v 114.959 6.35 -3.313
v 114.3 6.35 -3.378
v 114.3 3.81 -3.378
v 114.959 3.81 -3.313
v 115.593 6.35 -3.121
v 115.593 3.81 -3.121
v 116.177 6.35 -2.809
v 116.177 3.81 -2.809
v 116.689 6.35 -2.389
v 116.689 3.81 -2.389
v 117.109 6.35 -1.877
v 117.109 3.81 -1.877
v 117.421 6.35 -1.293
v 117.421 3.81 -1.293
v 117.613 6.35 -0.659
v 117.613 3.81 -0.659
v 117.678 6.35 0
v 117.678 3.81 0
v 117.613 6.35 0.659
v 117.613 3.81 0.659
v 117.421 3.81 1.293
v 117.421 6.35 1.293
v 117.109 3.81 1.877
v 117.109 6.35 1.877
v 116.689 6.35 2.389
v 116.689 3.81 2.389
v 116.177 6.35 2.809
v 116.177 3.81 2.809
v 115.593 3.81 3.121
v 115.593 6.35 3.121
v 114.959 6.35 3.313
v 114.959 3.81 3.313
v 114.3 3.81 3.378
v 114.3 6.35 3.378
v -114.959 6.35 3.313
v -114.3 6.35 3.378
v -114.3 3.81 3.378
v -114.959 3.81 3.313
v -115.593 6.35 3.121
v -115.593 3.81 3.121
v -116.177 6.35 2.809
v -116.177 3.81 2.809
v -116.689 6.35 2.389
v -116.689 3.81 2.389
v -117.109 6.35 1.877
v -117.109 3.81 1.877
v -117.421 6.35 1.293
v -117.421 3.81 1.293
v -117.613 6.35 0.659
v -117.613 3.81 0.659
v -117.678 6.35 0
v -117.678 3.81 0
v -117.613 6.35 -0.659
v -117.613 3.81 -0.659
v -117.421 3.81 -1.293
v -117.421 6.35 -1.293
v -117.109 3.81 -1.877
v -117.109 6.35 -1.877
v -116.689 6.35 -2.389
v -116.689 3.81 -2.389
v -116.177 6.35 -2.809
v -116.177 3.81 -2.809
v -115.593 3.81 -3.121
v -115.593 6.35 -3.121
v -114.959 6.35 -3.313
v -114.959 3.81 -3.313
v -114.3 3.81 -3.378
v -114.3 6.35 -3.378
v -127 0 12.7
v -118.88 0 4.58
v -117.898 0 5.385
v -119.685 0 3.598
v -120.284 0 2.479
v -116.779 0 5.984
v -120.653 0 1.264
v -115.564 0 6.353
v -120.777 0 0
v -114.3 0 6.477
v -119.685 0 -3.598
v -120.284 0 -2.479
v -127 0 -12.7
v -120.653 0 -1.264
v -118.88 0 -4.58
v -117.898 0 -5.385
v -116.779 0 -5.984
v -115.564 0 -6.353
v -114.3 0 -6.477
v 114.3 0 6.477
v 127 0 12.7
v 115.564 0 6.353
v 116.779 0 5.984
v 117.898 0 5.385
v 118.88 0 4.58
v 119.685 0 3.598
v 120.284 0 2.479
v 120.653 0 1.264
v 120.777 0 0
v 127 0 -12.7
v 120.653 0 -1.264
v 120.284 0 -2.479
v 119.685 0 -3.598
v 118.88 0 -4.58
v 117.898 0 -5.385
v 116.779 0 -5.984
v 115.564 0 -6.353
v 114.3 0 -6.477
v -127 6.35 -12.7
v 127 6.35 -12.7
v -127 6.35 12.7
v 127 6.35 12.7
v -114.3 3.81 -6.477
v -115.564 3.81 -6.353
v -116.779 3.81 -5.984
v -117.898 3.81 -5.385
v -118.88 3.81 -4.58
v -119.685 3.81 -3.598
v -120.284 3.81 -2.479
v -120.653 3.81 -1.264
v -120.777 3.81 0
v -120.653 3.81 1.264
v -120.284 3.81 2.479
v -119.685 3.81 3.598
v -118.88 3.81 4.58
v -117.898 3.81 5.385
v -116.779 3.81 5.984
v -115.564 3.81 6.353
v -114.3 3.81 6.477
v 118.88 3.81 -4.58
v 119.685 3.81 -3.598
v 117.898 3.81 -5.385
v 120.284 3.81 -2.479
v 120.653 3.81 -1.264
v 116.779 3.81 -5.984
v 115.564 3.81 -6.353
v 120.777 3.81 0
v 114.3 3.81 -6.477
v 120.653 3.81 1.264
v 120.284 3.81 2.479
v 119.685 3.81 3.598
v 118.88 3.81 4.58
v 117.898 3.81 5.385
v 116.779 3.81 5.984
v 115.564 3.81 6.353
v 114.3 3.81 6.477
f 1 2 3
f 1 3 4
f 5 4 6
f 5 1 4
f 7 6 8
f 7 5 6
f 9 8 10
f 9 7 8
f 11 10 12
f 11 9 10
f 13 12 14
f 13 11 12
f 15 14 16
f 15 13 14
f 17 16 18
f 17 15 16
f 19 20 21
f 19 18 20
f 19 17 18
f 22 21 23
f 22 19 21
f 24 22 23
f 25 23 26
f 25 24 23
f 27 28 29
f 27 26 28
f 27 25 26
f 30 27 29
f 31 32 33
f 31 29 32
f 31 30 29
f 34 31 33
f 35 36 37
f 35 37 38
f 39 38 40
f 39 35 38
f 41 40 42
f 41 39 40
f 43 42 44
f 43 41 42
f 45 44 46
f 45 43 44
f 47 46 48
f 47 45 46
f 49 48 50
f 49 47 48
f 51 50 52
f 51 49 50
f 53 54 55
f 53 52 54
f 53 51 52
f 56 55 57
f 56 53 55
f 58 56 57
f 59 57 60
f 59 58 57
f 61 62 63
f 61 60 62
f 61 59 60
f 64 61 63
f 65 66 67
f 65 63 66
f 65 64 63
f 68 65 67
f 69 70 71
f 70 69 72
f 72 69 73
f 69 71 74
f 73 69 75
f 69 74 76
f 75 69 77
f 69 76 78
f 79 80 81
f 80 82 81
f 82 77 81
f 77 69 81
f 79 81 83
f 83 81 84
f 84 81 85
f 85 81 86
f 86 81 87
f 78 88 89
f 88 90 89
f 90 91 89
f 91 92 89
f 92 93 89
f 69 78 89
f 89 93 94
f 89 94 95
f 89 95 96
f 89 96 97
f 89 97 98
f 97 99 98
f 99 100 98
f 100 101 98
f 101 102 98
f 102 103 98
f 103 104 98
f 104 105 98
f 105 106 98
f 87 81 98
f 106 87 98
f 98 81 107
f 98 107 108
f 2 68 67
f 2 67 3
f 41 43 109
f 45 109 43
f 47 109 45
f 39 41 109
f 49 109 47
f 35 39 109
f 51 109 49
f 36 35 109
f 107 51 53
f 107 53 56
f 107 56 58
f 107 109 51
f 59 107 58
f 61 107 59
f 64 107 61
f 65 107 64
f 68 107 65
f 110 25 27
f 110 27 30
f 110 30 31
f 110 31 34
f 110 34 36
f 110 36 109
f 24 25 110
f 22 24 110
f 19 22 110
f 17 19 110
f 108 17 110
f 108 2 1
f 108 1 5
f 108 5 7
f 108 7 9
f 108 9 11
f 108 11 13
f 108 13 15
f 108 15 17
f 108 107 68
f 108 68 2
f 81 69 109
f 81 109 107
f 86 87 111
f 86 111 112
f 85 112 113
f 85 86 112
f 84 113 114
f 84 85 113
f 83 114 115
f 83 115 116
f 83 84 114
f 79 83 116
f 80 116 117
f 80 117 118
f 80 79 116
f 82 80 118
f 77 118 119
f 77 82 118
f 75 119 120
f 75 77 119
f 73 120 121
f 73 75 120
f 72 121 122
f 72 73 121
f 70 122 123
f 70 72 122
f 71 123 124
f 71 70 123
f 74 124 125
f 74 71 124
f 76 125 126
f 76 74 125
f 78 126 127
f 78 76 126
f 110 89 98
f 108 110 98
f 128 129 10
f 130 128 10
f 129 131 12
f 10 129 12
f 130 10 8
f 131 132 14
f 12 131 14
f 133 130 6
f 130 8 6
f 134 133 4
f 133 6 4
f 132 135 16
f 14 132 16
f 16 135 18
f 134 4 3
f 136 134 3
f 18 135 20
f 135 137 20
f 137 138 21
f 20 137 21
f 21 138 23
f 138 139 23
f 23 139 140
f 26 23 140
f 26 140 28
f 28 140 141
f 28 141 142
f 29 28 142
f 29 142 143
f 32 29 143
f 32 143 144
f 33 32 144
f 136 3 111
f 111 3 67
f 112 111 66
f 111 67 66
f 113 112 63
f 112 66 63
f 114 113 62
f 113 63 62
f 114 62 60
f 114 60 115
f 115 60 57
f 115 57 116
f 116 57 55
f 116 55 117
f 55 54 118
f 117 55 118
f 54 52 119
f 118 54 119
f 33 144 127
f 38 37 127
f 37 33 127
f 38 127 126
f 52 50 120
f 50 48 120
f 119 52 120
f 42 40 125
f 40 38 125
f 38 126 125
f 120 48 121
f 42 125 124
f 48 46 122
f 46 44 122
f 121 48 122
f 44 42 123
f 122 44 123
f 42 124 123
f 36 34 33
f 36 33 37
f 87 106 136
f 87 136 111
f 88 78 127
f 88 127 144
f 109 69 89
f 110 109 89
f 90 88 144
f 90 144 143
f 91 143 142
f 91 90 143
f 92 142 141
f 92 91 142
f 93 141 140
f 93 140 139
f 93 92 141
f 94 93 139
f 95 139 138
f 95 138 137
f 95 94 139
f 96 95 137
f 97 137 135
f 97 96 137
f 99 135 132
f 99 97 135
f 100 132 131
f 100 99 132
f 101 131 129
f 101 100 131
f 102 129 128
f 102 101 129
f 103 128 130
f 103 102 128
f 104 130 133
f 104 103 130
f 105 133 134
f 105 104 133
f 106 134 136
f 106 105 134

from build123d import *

# Parameters (mm, degrees)
SKETCH1_W           = 254
SKETCH1_H           = 25.4
BOSS_EXTRUDE1_DEPTH = 6.35
CUT_EXTRUDE1_DEPTH  = 128.791284914
CUT_EXTRUDE2_DEPTH  = 3.81


with BuildPart() as part:
    # Sketch1 → Boss-Extrude1 (new body)
    with BuildSketch(Plane(origin=(0, 0, 0), x_dir=(1, 0, 0), z_dir=(0, 1, 0))):
        Rectangle(SKETCH1_W, SKETCH1_H)
    extrude(amount=BOSS_EXTRUDE1_DEPTH)

    # Sketch2 → Cut-Extrude1 (cut, through all)
    with BuildSketch(Plane(origin=(0, 6.35, 0), x_dir=(1, 0, 0), z_dir=(0, 1, 0))):
        with BuildLine():
            Line((-114.3, 3.3782), (114.3, 3.3782))
            ThreePointArc((114.3, 3.3782), (117.6782, 0), (114.3, -3.3782))
            Line((114.3, -3.3782), (-114.3, -3.3782))
            ThreePointArc((-114.3, -3.3782), (-117.6782, 0), (-114.3, 3.3782))
        make_face()
    extrude(amount=-CUT_EXTRUDE1_DEPTH, mode=Mode.SUBTRACT)

    # Sketch3 → Cut-Extrude2 (cut)
    with BuildSketch(Plane.XZ):
        with BuildLine():
            Line((-114.3, 6.477), (114.3, 6.477))
            ThreePointArc((114.3, 6.477), (120.777, 0), (114.3, -6.477))
            Line((114.3, -6.477), (-114.3, -6.477))
            ThreePointArc((-114.3, -6.477), (-120.777, 0), (-114.3, 6.477))
        make_face()
    extrude(amount=-CUT_EXTRUDE2_DEPTH, mode=Mode.SUBTRACT)


solid = part.part
